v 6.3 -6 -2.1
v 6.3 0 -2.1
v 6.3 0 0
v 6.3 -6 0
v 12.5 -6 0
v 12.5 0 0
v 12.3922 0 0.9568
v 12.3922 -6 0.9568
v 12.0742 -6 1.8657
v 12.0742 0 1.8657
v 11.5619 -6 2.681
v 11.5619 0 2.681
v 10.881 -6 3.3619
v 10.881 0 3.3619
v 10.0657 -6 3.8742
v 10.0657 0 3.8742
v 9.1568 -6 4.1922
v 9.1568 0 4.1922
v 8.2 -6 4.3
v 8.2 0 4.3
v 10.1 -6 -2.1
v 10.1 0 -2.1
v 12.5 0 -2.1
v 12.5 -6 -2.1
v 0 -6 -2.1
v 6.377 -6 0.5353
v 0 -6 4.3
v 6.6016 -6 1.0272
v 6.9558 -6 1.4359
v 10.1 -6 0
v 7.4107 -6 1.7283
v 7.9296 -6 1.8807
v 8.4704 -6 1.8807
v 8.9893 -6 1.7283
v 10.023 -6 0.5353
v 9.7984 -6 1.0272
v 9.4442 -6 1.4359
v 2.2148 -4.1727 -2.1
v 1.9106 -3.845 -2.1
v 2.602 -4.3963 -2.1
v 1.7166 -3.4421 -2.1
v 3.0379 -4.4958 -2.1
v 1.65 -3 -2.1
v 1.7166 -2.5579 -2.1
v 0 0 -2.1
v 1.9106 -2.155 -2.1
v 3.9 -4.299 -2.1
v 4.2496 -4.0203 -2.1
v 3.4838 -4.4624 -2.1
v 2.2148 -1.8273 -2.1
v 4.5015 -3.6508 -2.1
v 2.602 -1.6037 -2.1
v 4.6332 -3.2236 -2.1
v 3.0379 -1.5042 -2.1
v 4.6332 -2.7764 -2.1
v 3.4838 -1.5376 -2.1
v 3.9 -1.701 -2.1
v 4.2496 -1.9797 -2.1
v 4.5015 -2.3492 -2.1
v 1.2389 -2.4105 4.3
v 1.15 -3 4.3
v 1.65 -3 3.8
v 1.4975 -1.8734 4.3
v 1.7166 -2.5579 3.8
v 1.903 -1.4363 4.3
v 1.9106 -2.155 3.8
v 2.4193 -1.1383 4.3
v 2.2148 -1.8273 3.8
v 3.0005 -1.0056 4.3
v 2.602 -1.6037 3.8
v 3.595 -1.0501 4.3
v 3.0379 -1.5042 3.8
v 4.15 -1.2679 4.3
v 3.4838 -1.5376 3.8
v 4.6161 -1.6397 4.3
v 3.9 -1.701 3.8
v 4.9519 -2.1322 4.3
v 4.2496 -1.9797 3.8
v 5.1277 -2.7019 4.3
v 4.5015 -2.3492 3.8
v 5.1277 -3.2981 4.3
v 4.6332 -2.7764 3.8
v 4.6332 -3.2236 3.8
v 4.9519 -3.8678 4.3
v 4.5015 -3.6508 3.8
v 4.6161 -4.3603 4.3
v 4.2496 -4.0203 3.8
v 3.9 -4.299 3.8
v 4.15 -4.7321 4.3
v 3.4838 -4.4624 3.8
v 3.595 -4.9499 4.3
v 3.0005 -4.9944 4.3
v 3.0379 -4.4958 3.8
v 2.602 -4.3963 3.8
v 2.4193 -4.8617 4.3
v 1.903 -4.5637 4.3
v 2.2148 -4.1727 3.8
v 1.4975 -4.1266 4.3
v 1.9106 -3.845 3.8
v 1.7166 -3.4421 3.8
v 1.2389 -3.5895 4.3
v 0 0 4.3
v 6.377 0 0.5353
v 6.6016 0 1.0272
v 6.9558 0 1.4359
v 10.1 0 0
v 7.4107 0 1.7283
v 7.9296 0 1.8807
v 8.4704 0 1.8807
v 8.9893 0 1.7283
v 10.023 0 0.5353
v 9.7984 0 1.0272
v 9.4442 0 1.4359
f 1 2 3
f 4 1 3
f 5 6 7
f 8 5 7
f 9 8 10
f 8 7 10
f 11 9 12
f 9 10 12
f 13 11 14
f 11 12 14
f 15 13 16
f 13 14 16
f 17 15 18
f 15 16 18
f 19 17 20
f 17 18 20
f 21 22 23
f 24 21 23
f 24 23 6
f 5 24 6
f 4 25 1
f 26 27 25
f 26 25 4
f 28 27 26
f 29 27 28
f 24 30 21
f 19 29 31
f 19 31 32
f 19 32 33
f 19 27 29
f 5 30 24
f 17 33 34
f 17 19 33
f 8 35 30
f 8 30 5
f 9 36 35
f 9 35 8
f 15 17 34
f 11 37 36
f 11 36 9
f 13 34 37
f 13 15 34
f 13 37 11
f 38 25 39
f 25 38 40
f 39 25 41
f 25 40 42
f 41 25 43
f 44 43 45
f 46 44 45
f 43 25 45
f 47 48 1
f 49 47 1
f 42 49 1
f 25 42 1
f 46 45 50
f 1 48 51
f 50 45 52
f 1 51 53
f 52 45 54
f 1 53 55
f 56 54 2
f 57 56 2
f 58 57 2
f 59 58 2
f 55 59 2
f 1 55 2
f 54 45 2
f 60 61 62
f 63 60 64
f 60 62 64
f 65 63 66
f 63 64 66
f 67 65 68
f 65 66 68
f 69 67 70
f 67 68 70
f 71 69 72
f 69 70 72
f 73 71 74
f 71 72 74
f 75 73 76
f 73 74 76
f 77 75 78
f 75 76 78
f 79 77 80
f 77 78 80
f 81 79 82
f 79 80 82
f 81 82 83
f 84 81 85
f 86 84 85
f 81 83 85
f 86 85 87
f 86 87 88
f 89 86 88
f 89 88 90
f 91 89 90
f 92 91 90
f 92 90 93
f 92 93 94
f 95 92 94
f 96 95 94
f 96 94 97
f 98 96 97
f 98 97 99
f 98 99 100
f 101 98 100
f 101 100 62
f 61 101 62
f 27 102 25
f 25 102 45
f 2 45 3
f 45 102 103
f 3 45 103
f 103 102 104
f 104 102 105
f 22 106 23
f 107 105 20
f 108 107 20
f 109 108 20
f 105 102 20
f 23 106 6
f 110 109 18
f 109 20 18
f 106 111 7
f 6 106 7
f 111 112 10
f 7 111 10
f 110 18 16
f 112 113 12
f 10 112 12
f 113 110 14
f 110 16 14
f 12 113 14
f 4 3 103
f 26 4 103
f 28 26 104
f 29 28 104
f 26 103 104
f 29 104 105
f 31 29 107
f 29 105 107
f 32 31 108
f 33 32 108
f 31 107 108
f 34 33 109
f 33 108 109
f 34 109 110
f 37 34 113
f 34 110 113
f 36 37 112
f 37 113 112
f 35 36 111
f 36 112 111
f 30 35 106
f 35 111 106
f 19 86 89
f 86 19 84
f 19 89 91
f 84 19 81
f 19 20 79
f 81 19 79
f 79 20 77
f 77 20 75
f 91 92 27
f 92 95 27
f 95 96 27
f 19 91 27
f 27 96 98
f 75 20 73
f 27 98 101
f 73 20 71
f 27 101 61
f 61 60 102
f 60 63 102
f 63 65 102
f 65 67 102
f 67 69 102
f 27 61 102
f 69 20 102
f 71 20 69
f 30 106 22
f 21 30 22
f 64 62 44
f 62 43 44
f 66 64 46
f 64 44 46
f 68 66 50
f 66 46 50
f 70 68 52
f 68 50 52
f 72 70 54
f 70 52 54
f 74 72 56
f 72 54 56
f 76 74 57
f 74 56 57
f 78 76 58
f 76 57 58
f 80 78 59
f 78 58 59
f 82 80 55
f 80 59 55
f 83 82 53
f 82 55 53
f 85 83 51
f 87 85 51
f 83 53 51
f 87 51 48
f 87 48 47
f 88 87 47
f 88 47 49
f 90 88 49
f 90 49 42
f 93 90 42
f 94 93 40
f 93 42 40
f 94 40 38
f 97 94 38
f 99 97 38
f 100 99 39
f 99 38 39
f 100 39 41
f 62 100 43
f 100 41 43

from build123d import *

# Parameters (mm, degrees)
F1_DEPTH       = 6
F3_D           = 3
F3_CSINK_D     = 4
F3_CSINK_ANGLE = 90


# Not quite as in the source:
# - a feature names something its author has since deleted; it is built from what else it names


with BuildPart() as f1:
    # F0 (on Front) → F1 (new body)
    with BuildSketch(Plane.XZ):
        with BuildLine():
            Line((12.5, -2.1), (12.5, 0))
            ThreePointArc((12.5, 0), (11.2405591591, 3.0405591591), (8.2, 4.3))
            Line((8.2, 4.3), (0, 4.3))
            Line((0, 4.3), (0, -2.1))
            Line((0, -2.1), (6.3, -2.1))
            Line((6.3, -2.1), (6.3, 0))
            ThreePointArc((6.3, 0), (8.2, 1.9), (10.1, 0))
            Line((10.1, 0), (10.1, -2.1))
            Line((10.1, -2.1), (12.5, -2.1))
        make_face()
    extrude(amount=F1_DEPTH)

    # F3 (through all)
    with Locations(Plane.XY.offset(4.3)):
        with Locations((3.15, -3)):
            CounterSinkHole(F3_D / 2, F3_CSINK_D / 2, counter_sink_angle=F3_CSINK_ANGLE)


solid = f1.part
